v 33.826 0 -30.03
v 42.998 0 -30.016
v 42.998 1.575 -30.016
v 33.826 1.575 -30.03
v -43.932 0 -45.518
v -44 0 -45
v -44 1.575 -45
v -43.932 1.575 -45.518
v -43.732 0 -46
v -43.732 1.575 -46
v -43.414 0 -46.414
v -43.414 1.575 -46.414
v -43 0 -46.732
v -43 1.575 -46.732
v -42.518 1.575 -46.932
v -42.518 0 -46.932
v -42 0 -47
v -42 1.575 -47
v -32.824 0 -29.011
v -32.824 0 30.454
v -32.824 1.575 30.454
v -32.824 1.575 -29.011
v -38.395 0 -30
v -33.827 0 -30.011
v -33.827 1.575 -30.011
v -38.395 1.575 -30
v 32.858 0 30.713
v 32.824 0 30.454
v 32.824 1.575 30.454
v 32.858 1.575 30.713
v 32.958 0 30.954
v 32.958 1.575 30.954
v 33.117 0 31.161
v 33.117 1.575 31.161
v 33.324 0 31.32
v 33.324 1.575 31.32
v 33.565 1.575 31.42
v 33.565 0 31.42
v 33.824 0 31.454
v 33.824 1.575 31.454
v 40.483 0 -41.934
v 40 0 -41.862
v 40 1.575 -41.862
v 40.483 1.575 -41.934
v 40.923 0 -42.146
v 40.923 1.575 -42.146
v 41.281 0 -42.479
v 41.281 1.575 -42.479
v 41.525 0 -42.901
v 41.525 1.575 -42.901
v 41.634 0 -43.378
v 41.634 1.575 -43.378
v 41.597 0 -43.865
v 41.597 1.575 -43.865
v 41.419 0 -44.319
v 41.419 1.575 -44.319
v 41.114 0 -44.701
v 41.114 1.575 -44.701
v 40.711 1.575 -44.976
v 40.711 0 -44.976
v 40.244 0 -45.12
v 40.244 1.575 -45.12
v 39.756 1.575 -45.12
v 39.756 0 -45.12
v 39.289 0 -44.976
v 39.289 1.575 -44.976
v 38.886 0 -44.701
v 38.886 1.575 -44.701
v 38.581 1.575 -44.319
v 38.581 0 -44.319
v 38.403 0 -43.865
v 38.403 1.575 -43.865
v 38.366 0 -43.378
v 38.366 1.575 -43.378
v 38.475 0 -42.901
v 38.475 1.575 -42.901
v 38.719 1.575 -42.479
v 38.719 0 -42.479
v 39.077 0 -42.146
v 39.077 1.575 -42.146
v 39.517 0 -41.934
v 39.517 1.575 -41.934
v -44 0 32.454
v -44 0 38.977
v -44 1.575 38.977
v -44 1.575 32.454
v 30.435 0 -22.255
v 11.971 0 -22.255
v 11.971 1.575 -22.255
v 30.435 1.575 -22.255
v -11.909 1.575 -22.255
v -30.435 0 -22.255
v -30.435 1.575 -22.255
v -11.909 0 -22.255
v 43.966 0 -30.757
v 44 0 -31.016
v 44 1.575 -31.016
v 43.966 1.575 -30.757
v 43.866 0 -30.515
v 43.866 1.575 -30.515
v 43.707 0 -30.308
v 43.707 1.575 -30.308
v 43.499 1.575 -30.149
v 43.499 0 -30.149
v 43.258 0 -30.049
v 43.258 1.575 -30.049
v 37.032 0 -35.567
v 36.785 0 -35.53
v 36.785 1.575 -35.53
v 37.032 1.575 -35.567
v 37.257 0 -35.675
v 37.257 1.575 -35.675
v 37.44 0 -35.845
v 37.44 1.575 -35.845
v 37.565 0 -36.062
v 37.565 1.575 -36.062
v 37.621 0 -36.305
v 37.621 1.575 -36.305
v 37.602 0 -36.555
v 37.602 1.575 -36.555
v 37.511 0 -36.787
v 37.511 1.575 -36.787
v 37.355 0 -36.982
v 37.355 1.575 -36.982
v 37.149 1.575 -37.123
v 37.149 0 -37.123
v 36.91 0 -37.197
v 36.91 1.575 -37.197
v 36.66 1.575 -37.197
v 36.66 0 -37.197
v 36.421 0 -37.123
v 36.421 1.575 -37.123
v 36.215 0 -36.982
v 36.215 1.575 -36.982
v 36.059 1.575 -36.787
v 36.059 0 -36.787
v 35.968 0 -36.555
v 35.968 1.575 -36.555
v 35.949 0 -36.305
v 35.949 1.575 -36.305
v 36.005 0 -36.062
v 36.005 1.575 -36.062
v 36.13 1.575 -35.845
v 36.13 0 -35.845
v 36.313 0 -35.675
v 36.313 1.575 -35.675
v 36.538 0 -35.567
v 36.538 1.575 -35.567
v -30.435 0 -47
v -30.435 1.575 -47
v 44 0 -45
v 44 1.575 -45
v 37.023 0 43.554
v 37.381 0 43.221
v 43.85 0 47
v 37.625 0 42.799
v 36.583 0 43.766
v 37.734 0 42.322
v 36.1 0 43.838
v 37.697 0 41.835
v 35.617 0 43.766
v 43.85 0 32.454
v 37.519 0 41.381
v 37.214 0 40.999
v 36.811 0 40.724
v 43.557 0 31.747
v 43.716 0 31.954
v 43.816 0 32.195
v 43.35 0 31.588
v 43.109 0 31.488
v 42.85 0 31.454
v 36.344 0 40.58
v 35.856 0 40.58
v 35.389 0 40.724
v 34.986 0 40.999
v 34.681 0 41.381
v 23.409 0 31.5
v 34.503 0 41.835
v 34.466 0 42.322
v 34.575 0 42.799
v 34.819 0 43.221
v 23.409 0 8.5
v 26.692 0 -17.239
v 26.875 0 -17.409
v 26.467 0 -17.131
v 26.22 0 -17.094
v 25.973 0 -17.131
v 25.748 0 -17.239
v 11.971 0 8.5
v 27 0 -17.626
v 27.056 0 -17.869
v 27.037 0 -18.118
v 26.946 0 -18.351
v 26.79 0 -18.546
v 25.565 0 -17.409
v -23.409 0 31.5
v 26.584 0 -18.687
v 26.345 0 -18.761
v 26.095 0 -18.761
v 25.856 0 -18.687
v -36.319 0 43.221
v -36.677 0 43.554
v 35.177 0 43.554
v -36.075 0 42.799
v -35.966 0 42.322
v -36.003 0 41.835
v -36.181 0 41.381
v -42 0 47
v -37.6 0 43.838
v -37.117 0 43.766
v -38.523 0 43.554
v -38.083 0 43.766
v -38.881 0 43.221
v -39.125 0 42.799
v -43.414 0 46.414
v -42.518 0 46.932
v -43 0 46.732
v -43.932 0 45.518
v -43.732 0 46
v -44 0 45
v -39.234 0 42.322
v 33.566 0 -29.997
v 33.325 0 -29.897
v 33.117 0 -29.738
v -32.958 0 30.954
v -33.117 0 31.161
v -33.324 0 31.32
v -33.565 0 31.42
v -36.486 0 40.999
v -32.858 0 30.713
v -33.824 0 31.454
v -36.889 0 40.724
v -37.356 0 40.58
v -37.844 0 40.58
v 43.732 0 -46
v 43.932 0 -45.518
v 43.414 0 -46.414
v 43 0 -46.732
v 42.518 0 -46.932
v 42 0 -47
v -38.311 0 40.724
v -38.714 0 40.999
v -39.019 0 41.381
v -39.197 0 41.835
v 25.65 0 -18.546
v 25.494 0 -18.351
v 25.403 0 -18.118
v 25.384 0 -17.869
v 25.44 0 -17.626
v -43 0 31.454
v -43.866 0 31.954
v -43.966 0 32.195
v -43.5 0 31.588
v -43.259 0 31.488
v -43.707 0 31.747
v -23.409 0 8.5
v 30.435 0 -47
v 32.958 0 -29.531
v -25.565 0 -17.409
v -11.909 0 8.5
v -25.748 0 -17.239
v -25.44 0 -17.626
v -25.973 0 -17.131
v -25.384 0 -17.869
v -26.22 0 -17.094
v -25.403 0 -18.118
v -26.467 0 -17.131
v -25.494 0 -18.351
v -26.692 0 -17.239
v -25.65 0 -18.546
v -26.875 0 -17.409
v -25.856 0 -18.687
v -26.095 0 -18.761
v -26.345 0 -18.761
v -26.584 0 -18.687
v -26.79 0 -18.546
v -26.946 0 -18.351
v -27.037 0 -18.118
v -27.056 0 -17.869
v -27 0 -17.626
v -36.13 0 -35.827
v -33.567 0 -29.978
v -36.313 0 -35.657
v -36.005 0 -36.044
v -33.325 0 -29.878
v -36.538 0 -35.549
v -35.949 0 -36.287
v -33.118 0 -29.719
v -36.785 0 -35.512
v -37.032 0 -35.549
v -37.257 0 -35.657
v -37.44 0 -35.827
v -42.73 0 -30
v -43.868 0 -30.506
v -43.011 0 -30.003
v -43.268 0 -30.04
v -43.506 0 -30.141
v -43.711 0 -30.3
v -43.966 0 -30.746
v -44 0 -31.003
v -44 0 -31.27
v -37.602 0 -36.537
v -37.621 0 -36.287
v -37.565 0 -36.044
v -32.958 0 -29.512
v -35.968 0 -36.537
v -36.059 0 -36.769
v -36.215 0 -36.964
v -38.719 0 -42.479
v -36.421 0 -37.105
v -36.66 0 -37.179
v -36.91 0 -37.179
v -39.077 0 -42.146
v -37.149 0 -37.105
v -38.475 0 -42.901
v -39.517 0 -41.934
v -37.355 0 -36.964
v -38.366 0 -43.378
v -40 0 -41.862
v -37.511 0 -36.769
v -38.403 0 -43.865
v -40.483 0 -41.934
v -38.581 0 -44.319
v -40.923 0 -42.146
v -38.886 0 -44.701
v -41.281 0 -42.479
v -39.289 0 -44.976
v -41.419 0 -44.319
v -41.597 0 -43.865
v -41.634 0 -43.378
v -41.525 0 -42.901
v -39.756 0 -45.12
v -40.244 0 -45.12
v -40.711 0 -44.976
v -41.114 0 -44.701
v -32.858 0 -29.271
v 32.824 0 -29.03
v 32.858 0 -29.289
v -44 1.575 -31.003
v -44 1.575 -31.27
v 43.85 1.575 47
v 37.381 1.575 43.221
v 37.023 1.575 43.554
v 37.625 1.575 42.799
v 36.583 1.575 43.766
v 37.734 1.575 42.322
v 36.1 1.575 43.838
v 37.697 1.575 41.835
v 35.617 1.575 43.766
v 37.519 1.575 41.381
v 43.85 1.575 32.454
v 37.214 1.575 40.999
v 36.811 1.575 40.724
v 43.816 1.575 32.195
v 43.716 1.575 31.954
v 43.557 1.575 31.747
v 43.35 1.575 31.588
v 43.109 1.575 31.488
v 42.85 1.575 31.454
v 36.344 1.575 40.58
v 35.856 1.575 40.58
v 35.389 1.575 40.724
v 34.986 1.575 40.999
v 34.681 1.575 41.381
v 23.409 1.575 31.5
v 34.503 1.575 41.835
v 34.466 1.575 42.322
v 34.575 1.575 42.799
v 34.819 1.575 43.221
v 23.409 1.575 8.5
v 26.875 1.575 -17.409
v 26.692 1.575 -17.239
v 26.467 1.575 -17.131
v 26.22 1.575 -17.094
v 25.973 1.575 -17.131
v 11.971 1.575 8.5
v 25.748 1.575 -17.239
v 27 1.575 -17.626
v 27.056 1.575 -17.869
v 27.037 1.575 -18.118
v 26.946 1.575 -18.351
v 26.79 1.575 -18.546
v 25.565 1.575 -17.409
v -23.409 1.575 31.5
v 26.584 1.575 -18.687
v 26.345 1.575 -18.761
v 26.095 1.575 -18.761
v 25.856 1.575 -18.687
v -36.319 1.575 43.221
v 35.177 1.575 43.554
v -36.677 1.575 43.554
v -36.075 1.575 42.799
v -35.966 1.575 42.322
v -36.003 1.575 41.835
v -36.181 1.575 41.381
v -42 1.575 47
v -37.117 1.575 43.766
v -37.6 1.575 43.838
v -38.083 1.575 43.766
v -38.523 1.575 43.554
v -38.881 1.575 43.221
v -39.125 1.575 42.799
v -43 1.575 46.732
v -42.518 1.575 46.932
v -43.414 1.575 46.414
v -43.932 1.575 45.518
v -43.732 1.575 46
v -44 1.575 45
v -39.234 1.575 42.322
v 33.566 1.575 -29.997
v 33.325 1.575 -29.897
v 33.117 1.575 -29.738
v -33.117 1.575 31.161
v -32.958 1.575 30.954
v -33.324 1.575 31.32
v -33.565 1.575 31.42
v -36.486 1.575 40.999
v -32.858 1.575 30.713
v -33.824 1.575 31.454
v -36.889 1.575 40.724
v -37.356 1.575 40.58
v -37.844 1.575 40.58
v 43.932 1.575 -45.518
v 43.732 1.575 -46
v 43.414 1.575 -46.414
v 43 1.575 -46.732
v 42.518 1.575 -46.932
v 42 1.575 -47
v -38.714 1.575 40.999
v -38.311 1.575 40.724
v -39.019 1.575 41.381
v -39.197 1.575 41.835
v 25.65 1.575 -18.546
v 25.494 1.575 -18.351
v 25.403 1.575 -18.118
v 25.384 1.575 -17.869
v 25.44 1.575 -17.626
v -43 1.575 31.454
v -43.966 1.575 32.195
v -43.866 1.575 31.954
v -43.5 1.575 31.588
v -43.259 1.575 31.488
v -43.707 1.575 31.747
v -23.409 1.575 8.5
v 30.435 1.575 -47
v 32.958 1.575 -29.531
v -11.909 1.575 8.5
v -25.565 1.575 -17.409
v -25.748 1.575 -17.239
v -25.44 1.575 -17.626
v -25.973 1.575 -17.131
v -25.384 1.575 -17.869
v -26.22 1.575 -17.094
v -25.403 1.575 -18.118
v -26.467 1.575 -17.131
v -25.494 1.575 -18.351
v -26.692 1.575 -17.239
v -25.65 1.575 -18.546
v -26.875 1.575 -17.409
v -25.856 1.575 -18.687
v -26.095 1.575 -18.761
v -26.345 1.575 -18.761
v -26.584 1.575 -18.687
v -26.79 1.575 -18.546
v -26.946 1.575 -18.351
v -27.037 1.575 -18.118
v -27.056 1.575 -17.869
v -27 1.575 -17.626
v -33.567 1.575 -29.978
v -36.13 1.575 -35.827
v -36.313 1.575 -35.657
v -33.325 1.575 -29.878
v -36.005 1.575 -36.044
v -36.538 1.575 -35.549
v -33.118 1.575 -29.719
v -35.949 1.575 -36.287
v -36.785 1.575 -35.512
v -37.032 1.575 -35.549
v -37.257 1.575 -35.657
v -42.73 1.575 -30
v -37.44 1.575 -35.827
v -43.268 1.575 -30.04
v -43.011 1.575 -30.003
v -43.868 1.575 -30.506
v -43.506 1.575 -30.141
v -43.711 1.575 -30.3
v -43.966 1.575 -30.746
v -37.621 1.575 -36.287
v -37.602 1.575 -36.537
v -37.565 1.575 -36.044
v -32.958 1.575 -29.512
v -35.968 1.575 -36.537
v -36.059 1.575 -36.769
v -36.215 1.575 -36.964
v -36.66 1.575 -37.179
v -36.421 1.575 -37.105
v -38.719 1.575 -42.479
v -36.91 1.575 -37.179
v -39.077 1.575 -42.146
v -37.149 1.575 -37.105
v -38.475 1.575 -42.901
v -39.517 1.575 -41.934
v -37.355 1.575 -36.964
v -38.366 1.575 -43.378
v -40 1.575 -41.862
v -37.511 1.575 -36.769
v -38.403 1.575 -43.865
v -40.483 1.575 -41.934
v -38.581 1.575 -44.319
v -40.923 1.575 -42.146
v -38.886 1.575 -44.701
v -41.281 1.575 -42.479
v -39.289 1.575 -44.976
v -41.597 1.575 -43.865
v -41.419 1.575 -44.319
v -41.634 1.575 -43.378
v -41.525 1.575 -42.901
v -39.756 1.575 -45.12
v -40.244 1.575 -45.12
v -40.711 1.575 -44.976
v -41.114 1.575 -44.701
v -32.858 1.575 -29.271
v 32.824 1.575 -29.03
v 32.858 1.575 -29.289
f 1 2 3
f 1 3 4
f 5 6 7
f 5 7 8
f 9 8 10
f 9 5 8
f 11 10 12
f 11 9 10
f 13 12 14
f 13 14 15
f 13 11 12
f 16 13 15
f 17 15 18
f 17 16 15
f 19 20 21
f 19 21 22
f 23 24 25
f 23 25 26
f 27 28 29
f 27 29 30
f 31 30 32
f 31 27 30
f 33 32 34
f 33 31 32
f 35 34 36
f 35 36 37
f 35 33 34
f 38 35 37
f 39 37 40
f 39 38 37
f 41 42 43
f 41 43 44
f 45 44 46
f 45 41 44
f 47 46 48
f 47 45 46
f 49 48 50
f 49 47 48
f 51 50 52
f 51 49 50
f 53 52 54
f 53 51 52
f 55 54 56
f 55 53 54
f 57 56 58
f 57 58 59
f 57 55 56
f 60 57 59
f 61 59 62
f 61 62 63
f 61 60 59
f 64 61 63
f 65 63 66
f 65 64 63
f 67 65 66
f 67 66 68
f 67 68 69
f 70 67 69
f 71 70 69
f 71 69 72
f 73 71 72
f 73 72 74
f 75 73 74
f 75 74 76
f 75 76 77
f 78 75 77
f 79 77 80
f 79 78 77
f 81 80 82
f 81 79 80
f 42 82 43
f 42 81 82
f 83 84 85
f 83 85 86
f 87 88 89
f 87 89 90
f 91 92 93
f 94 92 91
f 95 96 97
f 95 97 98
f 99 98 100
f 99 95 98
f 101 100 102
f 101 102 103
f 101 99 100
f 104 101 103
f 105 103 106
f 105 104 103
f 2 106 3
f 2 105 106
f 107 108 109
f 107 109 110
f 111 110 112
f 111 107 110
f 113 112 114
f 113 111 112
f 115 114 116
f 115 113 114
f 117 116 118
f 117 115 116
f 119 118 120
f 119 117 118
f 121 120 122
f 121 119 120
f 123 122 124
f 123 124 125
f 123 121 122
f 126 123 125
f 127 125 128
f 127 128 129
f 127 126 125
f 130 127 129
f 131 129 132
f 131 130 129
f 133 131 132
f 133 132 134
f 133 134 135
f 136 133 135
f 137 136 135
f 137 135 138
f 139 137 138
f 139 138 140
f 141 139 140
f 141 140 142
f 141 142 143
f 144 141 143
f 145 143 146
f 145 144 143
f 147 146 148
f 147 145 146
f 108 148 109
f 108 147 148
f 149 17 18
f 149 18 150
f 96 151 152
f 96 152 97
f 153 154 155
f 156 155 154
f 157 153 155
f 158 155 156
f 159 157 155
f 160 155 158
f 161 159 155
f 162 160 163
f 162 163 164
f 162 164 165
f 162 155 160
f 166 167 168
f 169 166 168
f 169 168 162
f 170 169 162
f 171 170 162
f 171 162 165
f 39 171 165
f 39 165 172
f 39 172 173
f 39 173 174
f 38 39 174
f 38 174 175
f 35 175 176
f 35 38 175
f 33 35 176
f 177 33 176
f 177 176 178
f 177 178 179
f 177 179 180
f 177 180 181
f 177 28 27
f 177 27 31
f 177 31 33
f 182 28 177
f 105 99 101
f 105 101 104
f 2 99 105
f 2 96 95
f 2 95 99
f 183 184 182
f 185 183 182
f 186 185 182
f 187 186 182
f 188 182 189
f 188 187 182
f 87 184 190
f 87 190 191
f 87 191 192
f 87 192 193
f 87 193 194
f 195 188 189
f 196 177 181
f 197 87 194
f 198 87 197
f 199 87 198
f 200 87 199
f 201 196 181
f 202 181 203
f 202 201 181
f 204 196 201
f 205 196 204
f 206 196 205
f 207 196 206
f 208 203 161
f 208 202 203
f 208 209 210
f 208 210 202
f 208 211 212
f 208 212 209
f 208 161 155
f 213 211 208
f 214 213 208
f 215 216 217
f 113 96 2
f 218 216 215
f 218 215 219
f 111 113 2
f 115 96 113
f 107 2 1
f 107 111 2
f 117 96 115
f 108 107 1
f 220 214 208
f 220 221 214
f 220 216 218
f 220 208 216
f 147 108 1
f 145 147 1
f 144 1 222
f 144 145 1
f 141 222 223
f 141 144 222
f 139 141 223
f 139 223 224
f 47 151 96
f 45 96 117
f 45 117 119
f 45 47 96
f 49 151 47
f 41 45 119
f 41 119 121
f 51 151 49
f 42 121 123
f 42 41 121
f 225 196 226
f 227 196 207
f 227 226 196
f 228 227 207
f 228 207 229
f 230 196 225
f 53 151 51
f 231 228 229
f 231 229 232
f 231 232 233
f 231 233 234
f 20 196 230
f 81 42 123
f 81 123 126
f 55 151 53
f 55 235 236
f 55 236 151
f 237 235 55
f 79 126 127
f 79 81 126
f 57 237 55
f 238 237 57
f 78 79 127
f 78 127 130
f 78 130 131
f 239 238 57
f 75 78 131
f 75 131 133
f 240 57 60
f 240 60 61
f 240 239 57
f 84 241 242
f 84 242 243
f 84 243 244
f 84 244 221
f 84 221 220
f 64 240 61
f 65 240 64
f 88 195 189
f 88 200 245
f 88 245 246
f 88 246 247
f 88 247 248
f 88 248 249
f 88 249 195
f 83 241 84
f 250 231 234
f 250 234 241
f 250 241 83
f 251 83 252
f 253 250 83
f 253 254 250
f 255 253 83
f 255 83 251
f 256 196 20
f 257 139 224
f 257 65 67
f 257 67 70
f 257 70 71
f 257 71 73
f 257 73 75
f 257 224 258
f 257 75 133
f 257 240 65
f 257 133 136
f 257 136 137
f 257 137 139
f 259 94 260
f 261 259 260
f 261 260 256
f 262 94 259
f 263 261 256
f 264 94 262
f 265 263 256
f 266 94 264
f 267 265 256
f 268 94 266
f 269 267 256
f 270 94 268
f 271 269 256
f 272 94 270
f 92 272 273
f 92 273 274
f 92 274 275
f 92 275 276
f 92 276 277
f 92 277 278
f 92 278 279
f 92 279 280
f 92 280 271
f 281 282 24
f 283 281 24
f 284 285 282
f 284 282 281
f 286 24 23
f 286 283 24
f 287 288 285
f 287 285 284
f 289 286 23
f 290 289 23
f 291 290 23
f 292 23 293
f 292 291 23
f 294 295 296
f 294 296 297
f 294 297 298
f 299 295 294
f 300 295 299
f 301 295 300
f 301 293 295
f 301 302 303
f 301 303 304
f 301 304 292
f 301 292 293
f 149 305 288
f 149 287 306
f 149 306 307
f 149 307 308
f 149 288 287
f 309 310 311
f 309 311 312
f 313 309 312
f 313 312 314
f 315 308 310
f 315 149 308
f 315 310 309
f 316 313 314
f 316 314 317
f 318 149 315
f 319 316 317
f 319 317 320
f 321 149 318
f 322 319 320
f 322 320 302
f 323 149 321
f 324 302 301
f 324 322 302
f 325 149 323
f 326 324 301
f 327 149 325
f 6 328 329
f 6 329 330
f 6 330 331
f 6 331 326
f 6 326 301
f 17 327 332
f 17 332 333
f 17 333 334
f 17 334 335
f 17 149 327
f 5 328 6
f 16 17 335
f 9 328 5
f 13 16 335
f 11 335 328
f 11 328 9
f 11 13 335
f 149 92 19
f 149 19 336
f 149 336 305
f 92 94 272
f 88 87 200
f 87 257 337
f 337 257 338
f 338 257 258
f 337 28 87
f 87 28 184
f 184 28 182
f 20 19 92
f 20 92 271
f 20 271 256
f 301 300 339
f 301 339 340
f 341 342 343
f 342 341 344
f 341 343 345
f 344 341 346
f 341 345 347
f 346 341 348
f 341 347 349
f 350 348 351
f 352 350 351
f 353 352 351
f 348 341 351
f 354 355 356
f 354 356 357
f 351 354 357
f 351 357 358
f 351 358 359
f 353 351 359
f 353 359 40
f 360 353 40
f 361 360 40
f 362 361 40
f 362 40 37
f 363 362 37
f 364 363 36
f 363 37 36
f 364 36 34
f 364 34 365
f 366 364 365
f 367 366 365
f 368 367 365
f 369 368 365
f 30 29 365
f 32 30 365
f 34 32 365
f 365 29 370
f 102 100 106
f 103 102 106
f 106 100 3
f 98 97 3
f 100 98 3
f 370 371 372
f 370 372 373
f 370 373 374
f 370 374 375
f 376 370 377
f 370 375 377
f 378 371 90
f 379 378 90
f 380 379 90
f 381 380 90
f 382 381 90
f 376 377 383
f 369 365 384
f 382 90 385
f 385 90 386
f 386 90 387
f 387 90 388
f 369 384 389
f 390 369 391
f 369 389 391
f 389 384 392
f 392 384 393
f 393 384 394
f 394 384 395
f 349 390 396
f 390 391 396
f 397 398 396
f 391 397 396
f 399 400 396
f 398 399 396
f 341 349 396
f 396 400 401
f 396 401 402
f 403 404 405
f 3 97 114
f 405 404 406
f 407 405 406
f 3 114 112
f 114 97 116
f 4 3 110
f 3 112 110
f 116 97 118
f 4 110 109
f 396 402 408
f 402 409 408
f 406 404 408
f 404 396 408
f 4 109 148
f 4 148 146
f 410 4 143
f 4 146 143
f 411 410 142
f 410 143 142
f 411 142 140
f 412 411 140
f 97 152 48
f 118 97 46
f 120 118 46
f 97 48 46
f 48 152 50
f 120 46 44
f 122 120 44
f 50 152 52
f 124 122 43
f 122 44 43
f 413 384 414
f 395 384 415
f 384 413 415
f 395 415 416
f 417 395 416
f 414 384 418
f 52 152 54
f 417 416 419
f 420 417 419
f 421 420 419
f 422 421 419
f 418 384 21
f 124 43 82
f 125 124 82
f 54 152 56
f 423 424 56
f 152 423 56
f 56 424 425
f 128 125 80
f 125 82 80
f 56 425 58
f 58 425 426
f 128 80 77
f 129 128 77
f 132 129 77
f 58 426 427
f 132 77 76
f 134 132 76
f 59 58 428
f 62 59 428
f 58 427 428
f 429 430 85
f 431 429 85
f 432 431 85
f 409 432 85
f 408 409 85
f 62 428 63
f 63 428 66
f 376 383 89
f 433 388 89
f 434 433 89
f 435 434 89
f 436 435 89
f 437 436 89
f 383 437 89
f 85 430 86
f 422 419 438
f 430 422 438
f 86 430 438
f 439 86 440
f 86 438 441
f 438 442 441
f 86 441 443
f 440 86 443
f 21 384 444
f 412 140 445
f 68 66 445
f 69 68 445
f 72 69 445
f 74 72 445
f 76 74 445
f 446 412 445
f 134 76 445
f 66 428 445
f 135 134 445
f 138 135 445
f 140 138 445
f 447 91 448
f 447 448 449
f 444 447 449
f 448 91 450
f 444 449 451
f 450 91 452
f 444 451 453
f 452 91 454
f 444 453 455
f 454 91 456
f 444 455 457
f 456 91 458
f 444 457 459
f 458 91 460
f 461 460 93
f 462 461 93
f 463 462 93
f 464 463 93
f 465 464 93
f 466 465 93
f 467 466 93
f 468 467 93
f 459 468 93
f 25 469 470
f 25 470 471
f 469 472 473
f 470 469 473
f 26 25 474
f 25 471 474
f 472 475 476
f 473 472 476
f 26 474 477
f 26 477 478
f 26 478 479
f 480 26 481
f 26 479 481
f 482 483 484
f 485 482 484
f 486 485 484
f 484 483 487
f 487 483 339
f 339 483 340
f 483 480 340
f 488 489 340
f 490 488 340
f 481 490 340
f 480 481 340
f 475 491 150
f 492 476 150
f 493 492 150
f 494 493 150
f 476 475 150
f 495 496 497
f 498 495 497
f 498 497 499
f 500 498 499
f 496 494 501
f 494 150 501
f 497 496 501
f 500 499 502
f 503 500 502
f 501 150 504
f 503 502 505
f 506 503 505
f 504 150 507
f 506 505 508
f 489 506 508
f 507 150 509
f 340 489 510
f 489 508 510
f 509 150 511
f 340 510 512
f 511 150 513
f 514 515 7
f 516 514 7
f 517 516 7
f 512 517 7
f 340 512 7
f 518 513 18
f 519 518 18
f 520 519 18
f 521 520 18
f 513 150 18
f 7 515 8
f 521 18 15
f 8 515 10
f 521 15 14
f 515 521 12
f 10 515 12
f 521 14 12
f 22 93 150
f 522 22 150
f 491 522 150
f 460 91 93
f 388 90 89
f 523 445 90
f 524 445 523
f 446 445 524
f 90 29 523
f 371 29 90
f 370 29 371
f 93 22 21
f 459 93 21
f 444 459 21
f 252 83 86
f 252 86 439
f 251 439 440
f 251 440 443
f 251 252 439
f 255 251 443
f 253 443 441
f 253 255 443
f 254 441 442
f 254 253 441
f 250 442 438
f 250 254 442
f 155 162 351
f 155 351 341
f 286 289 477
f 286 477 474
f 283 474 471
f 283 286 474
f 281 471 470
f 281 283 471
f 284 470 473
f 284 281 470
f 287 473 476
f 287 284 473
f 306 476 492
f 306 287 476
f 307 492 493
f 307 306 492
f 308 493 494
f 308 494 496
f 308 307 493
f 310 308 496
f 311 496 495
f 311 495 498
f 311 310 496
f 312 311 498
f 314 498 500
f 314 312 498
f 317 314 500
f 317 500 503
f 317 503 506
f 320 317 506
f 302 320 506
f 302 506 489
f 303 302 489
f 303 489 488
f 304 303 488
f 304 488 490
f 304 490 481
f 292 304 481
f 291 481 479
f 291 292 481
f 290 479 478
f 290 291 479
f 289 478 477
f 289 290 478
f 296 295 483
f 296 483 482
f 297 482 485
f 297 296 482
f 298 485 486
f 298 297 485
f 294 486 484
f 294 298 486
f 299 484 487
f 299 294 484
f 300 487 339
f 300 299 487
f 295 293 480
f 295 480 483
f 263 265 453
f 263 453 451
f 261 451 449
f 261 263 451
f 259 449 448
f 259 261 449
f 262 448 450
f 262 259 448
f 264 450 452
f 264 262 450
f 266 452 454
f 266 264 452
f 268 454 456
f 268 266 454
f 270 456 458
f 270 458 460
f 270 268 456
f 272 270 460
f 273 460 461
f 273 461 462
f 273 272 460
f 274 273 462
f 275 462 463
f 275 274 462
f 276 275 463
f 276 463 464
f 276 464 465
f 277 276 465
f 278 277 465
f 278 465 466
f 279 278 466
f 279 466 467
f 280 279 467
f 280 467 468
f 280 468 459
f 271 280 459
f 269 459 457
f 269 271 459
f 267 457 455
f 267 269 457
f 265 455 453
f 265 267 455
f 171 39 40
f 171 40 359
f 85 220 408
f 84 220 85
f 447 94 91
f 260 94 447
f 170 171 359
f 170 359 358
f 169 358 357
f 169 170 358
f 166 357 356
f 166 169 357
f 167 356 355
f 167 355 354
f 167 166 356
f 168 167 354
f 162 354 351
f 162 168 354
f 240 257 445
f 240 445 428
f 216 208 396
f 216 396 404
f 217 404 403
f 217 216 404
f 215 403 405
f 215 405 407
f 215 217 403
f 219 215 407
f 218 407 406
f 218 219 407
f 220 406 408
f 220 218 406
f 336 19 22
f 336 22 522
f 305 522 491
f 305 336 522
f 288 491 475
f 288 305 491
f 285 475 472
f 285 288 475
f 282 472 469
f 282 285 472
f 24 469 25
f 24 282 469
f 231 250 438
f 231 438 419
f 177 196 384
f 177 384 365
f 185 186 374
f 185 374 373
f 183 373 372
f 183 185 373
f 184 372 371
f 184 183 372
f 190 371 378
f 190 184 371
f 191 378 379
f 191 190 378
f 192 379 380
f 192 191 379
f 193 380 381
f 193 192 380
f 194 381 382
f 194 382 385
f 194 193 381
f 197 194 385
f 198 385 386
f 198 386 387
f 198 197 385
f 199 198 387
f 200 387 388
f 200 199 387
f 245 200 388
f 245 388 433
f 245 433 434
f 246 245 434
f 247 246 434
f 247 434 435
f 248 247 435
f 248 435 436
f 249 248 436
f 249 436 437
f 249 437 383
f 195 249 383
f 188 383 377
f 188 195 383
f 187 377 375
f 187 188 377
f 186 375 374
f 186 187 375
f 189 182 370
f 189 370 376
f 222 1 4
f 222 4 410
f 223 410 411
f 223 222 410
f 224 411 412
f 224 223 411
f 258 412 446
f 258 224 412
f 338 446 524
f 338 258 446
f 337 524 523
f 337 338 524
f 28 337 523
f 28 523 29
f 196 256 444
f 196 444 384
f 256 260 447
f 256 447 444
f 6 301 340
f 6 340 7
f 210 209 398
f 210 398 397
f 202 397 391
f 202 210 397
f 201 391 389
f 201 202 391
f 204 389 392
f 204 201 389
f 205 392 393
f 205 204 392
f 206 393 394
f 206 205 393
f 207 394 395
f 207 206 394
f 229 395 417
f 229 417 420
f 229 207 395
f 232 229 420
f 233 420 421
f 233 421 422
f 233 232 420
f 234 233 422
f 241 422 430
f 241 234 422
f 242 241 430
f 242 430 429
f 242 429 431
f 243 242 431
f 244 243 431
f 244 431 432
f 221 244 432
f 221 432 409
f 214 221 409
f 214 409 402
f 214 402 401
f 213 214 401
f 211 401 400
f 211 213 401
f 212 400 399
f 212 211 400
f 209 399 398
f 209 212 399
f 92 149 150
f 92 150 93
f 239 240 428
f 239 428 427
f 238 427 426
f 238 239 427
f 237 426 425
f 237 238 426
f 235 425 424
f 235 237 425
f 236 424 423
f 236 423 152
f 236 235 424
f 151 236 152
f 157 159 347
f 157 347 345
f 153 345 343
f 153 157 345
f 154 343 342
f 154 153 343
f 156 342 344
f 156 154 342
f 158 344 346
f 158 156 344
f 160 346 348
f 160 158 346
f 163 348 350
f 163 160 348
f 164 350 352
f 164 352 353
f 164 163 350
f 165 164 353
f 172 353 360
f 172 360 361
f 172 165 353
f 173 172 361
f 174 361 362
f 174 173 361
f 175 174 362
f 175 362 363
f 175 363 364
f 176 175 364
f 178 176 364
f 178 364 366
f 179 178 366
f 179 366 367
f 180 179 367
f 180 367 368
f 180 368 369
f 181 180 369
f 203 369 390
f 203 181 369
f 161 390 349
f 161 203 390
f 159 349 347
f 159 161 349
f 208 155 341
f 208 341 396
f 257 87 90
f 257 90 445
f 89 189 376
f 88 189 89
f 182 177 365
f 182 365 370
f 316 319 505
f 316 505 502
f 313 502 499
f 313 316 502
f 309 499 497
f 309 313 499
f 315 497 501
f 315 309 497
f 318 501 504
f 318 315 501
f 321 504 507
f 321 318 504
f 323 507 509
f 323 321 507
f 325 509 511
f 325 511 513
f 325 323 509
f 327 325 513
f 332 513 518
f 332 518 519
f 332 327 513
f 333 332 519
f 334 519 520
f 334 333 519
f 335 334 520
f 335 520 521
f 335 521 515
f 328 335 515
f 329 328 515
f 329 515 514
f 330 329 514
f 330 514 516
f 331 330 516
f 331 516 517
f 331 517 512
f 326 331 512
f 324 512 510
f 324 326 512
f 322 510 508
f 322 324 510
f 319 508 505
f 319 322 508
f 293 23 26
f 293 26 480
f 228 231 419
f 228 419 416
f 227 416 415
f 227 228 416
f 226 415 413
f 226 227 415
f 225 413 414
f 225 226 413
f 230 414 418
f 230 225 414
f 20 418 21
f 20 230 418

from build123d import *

# Parameters (mm, degrees)
SKETCH1_2_R         = 1.6383
SKETCH1_2_R_2       = 0.8382
BOSS_EXTRUDE2_DEPTH = 1.575


with BuildPart() as part:
    # Sketch1<2> → Boss-Extrude2 (new body)
    with BuildSketch(Plane(origin=(0, 0, 0), x_dir=(1, 0, 0), z_dir=(0, 1, 0))):
        with BuildLine():
            Line((-38.39500299, 29.999999735), (-42.73000299, 29.999999735))
            Line((-42.73000299, 29.999999735), (-43.011025994, 30.003097626))
            ThreePointArc((-43.011025994, 30.003097626), (-43.710996344, 30.299838092), (-44.000003042, 31.003036872))
            Line((-44.000003042, 31.003036872), (-44.000003042, 31.269999735))
            Line((-44.000003042, 31.269999735), (-44.000005679, 44.999999735))
            ThreePointArc((-44.000005679, 44.999999735), (-43.414218633, 46.414215608), (-42.000002924, 47.000003051))
            Line((-42.000002924, 47.000003051), (-30.435003, 47.000003051))
            Line((-30.435003, 47.000003051), (-30.435003, 22.255357341))
            Line((-30.435003, 22.255357341), (-11.909003, 22.255357341))
            Line((-11.909003, 22.255357341), (-11.909003, -8.5))
            Line((-11.909003, -8.5), (-23.409003, -8.5))
            Line((-23.409003, -8.5), (-23.409003, -31.499996949))
            Line((-23.409003, -31.499996949), (23.408997, -31.499996949))
            Line((23.408997, -31.499996949), (23.408997, -8.499997555))
            Line((23.408997, -8.499997555), (11.97084713, -8.499997555))
            Line((11.97084713, -8.499997555), (11.97084713, 22.255357341))
            Line((11.97084713, 22.255357341), (30.434997, 22.255357341))
            Line((30.434997, 22.255357341), (30.434997, 47.000003051))
            Line((30.434997, 47.000003051), (42.000008541, 47.000003051))
            ThreePointArc((42.000008541, 47.000003051), (43.414213215, 46.414220704), (43.999996956, 45.000016607))
            Line((43.999996956, 45.000016607), (43.999996956, 32.000003378))
            Line((43.999996956, 32.000003378), (43.999996956, 31.015615364))
            ThreePointArc((43.999996956, 31.015615364), (43.706534093, 30.307939396), (42.998386406, 30.015616661))
            Line((42.998386406, 30.015616661), (33.825607551, 30.030389905))
            ThreePointArc((33.825607551, 30.030389905), (33.117459864, 29.738067169), (32.823997, 29.030391202))
            Line((32.823997, 29.030391202), (32.823997, -30.453996949))
            ThreePointArc((32.823997, -30.453996949), (33.116890219, -31.16110373), (33.823997, -31.453996949))
            Line((33.823997, -31.453996949), (36.099999555, -31.453996949))
            Line((36.099999555, -31.453996949), (42.849728118, -31.453996949))
            ThreePointArc((42.849728118, -31.453996949), (43.556834899, -31.746890168), (43.849728118, -32.453996949))
            Line((43.849728118, -32.453996949), (43.849728118, -36.999996949))
            Line((43.849728118, -36.999996949), (43.849728118, -46.999996949))
            Line((43.849728118, -46.999996949), (-42.000000178, -46.999996949))
            ThreePointArc((-42.000000178, -46.999996949), (-43.414212804, -46.414211581), (-44.000000499, -44.999999921))
            Line((-44.000000499, -44.999999921), (-44.000000178, -38.976999921))
            Line((-44.000000178, -38.976999921), (-44.000000178, -32.453999802))
            ThreePointArc((-44.000000178, -32.453999802), (-43.70710696, -31.746893021), (-43.000000178, -31.453999802))
            Line((-43.000000178, -31.453999802), (-36.100000549, -31.453999802))
            Line((-36.100000549, -31.453999802), (-33.824003042, -31.453999802))
            ThreePointArc((-33.824003042, -31.453999802), (-33.116896261, -31.161106583), (-32.824003042, -30.453999802))
            Line((-32.824003042, -30.453999802), (-32.824003042, 29.011483943))
            ThreePointArc((-32.824003042, 29.011483943), (-33.117785331, 29.719478678), (-33.826516131, 30.011480785))
            Line((-33.826516131, 30.011480785), (-38.39500299, 29.999999735))
        make_face()
        with Locations((40, 43.5)):
            Circle(SKETCH1_2_R, mode=Mode.SUBTRACT)
        with Locations((-40, 43.5)):
            Circle(SKETCH1_2_R, mode=Mode.SUBTRACT)
        with Locations((-37.6, -42.2)):
            Circle(SKETCH1_2_R, mode=Mode.SUBTRACT)
        with Locations((36.1, -42.2)):
            Circle(SKETCH1_2_R, mode=Mode.SUBTRACT)
        with Locations((-36.785003, 36.350003051)):
            Circle(SKETCH1_2_R_2, mode=Mode.SUBTRACT)
        with Locations((-26.220003, 17.93193176)):
            Circle(SKETCH1_2_R_2, mode=Mode.SUBTRACT)
        with Locations((26.219997, 17.93193176)):
            Circle(SKETCH1_2_R_2, mode=Mode.SUBTRACT)
        with Locations((36.784997, 36.368003051)):
            Circle(SKETCH1_2_R_2, mode=Mode.SUBTRACT)
    extrude(amount=BOSS_EXTRUDE2_DEPTH)


solid = part.part
